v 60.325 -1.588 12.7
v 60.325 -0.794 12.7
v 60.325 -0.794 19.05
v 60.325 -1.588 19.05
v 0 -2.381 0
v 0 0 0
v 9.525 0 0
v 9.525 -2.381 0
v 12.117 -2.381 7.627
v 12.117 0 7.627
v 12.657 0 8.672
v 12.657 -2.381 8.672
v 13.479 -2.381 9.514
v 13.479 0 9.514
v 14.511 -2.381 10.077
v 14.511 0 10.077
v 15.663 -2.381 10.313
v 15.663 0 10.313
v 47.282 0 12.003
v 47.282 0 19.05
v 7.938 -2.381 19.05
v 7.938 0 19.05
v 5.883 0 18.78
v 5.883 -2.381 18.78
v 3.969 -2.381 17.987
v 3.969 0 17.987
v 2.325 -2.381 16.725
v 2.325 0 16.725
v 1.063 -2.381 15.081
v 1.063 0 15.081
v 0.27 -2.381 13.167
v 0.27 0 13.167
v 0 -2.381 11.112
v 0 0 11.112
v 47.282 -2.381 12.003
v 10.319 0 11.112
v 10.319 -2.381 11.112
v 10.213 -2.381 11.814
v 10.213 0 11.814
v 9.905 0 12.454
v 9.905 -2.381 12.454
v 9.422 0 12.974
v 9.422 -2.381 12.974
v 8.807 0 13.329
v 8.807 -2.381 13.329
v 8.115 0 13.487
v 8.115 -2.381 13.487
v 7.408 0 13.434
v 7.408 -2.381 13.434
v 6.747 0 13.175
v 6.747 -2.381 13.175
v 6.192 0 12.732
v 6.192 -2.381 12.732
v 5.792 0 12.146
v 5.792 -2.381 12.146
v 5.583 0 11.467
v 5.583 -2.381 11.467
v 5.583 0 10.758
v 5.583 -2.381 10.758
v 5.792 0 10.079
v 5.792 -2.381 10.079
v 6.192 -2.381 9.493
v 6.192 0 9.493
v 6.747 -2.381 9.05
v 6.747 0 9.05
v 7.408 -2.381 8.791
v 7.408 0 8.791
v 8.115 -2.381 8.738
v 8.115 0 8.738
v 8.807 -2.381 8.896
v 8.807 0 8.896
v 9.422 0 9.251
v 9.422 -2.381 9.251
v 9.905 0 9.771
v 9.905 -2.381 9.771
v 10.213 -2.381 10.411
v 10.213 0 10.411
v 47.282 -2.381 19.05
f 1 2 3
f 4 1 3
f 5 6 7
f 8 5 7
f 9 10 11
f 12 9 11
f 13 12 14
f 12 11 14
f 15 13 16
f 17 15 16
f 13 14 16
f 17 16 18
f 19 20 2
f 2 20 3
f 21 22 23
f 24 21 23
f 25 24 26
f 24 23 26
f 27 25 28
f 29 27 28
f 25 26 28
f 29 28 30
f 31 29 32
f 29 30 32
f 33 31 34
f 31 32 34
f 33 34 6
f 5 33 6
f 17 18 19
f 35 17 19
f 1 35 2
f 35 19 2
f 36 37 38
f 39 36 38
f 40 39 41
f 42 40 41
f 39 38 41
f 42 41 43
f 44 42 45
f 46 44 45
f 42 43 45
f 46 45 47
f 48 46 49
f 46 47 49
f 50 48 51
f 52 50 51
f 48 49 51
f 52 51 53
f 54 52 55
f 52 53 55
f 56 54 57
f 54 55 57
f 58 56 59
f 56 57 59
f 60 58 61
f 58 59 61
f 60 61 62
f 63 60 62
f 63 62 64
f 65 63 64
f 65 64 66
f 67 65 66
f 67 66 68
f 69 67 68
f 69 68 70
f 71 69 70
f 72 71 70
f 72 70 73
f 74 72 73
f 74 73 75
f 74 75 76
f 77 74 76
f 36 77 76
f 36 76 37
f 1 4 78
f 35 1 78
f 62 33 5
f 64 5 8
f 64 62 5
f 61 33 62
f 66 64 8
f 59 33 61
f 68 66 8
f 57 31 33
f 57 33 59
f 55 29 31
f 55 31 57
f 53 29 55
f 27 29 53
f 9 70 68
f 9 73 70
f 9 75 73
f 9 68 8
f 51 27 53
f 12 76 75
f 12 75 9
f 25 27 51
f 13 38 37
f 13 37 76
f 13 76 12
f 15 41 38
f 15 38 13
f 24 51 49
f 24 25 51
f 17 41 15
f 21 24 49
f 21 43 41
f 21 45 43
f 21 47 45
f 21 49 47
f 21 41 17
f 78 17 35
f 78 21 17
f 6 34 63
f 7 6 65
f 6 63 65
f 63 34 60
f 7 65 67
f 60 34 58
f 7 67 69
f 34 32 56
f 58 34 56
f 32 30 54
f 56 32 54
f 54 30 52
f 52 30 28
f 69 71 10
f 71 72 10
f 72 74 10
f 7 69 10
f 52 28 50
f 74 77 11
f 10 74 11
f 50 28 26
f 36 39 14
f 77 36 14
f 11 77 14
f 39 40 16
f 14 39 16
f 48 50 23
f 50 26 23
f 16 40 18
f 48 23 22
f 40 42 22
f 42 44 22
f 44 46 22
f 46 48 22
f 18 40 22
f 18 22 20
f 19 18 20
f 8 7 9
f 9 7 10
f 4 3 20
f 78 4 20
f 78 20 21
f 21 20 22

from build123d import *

# Parameters (mm, degrees)
F1_DEPTH = 2.38125
F2_R     = 2.38125
F3_DEPTH = 2.38225
F5_DEPTH = 25.4


# Not quite as in the source:
# - a length typed as a fraction of an inch, garbled in the dataset ("3 / 203.2 mm" for 3/8 in), is restored


with BuildPart() as f1:
    # F0 (on Front) → F1 (new body)
    with BuildSketch(Plane.XZ):
        with BuildLine():
            Line((60.325, 19.05), (7.9375, 19.05))
            ThreePointArc((7.9375, 19.05), (2.3248399243, 16.7251600757), (0, 11.1125))
            Line((0, 11.1125), (0, 0))
            Line((0, 0), (9.525, 0))
            Line((9.525, 0), (12.1173647876, 7.6271664624))
            ThreePointArc((12.1173647876, 7.6271664624), (13.4786145605, 9.5135918491), (15.6631963617, 10.3130942181))
            Line((15.6631963617, 10.3130942181), (60.325, 12.7))
            Line((60.325, 12.7), (60.325, 19.05))
        make_face()
    extrude(amount=F1_DEPTH)

    # F2 (on face) → F3 (cut, through all)
    with BuildSketch(Plane.XZ.offset(2.38125)):
        with Locations((7.9375, 11.1125)):
            Circle(F2_R)
    extrude(amount=-F3_DEPTH, mode=Mode.SUBTRACT)

    # F4 (on face) → F5 (cut)
    with BuildSketch(Plane.XY.offset(19.05)):
        Polygon((60.325, 0), (47.2817567568, 0), (60.325, -0.79375), align=None)
        Polygon((60.325, -2.38125), (60.325, -1.5875), (47.2817567568, -2.38125), align=None)
    extrude(amount=-F5_DEPTH, mode=Mode.SUBTRACT)


solid = f1.part
